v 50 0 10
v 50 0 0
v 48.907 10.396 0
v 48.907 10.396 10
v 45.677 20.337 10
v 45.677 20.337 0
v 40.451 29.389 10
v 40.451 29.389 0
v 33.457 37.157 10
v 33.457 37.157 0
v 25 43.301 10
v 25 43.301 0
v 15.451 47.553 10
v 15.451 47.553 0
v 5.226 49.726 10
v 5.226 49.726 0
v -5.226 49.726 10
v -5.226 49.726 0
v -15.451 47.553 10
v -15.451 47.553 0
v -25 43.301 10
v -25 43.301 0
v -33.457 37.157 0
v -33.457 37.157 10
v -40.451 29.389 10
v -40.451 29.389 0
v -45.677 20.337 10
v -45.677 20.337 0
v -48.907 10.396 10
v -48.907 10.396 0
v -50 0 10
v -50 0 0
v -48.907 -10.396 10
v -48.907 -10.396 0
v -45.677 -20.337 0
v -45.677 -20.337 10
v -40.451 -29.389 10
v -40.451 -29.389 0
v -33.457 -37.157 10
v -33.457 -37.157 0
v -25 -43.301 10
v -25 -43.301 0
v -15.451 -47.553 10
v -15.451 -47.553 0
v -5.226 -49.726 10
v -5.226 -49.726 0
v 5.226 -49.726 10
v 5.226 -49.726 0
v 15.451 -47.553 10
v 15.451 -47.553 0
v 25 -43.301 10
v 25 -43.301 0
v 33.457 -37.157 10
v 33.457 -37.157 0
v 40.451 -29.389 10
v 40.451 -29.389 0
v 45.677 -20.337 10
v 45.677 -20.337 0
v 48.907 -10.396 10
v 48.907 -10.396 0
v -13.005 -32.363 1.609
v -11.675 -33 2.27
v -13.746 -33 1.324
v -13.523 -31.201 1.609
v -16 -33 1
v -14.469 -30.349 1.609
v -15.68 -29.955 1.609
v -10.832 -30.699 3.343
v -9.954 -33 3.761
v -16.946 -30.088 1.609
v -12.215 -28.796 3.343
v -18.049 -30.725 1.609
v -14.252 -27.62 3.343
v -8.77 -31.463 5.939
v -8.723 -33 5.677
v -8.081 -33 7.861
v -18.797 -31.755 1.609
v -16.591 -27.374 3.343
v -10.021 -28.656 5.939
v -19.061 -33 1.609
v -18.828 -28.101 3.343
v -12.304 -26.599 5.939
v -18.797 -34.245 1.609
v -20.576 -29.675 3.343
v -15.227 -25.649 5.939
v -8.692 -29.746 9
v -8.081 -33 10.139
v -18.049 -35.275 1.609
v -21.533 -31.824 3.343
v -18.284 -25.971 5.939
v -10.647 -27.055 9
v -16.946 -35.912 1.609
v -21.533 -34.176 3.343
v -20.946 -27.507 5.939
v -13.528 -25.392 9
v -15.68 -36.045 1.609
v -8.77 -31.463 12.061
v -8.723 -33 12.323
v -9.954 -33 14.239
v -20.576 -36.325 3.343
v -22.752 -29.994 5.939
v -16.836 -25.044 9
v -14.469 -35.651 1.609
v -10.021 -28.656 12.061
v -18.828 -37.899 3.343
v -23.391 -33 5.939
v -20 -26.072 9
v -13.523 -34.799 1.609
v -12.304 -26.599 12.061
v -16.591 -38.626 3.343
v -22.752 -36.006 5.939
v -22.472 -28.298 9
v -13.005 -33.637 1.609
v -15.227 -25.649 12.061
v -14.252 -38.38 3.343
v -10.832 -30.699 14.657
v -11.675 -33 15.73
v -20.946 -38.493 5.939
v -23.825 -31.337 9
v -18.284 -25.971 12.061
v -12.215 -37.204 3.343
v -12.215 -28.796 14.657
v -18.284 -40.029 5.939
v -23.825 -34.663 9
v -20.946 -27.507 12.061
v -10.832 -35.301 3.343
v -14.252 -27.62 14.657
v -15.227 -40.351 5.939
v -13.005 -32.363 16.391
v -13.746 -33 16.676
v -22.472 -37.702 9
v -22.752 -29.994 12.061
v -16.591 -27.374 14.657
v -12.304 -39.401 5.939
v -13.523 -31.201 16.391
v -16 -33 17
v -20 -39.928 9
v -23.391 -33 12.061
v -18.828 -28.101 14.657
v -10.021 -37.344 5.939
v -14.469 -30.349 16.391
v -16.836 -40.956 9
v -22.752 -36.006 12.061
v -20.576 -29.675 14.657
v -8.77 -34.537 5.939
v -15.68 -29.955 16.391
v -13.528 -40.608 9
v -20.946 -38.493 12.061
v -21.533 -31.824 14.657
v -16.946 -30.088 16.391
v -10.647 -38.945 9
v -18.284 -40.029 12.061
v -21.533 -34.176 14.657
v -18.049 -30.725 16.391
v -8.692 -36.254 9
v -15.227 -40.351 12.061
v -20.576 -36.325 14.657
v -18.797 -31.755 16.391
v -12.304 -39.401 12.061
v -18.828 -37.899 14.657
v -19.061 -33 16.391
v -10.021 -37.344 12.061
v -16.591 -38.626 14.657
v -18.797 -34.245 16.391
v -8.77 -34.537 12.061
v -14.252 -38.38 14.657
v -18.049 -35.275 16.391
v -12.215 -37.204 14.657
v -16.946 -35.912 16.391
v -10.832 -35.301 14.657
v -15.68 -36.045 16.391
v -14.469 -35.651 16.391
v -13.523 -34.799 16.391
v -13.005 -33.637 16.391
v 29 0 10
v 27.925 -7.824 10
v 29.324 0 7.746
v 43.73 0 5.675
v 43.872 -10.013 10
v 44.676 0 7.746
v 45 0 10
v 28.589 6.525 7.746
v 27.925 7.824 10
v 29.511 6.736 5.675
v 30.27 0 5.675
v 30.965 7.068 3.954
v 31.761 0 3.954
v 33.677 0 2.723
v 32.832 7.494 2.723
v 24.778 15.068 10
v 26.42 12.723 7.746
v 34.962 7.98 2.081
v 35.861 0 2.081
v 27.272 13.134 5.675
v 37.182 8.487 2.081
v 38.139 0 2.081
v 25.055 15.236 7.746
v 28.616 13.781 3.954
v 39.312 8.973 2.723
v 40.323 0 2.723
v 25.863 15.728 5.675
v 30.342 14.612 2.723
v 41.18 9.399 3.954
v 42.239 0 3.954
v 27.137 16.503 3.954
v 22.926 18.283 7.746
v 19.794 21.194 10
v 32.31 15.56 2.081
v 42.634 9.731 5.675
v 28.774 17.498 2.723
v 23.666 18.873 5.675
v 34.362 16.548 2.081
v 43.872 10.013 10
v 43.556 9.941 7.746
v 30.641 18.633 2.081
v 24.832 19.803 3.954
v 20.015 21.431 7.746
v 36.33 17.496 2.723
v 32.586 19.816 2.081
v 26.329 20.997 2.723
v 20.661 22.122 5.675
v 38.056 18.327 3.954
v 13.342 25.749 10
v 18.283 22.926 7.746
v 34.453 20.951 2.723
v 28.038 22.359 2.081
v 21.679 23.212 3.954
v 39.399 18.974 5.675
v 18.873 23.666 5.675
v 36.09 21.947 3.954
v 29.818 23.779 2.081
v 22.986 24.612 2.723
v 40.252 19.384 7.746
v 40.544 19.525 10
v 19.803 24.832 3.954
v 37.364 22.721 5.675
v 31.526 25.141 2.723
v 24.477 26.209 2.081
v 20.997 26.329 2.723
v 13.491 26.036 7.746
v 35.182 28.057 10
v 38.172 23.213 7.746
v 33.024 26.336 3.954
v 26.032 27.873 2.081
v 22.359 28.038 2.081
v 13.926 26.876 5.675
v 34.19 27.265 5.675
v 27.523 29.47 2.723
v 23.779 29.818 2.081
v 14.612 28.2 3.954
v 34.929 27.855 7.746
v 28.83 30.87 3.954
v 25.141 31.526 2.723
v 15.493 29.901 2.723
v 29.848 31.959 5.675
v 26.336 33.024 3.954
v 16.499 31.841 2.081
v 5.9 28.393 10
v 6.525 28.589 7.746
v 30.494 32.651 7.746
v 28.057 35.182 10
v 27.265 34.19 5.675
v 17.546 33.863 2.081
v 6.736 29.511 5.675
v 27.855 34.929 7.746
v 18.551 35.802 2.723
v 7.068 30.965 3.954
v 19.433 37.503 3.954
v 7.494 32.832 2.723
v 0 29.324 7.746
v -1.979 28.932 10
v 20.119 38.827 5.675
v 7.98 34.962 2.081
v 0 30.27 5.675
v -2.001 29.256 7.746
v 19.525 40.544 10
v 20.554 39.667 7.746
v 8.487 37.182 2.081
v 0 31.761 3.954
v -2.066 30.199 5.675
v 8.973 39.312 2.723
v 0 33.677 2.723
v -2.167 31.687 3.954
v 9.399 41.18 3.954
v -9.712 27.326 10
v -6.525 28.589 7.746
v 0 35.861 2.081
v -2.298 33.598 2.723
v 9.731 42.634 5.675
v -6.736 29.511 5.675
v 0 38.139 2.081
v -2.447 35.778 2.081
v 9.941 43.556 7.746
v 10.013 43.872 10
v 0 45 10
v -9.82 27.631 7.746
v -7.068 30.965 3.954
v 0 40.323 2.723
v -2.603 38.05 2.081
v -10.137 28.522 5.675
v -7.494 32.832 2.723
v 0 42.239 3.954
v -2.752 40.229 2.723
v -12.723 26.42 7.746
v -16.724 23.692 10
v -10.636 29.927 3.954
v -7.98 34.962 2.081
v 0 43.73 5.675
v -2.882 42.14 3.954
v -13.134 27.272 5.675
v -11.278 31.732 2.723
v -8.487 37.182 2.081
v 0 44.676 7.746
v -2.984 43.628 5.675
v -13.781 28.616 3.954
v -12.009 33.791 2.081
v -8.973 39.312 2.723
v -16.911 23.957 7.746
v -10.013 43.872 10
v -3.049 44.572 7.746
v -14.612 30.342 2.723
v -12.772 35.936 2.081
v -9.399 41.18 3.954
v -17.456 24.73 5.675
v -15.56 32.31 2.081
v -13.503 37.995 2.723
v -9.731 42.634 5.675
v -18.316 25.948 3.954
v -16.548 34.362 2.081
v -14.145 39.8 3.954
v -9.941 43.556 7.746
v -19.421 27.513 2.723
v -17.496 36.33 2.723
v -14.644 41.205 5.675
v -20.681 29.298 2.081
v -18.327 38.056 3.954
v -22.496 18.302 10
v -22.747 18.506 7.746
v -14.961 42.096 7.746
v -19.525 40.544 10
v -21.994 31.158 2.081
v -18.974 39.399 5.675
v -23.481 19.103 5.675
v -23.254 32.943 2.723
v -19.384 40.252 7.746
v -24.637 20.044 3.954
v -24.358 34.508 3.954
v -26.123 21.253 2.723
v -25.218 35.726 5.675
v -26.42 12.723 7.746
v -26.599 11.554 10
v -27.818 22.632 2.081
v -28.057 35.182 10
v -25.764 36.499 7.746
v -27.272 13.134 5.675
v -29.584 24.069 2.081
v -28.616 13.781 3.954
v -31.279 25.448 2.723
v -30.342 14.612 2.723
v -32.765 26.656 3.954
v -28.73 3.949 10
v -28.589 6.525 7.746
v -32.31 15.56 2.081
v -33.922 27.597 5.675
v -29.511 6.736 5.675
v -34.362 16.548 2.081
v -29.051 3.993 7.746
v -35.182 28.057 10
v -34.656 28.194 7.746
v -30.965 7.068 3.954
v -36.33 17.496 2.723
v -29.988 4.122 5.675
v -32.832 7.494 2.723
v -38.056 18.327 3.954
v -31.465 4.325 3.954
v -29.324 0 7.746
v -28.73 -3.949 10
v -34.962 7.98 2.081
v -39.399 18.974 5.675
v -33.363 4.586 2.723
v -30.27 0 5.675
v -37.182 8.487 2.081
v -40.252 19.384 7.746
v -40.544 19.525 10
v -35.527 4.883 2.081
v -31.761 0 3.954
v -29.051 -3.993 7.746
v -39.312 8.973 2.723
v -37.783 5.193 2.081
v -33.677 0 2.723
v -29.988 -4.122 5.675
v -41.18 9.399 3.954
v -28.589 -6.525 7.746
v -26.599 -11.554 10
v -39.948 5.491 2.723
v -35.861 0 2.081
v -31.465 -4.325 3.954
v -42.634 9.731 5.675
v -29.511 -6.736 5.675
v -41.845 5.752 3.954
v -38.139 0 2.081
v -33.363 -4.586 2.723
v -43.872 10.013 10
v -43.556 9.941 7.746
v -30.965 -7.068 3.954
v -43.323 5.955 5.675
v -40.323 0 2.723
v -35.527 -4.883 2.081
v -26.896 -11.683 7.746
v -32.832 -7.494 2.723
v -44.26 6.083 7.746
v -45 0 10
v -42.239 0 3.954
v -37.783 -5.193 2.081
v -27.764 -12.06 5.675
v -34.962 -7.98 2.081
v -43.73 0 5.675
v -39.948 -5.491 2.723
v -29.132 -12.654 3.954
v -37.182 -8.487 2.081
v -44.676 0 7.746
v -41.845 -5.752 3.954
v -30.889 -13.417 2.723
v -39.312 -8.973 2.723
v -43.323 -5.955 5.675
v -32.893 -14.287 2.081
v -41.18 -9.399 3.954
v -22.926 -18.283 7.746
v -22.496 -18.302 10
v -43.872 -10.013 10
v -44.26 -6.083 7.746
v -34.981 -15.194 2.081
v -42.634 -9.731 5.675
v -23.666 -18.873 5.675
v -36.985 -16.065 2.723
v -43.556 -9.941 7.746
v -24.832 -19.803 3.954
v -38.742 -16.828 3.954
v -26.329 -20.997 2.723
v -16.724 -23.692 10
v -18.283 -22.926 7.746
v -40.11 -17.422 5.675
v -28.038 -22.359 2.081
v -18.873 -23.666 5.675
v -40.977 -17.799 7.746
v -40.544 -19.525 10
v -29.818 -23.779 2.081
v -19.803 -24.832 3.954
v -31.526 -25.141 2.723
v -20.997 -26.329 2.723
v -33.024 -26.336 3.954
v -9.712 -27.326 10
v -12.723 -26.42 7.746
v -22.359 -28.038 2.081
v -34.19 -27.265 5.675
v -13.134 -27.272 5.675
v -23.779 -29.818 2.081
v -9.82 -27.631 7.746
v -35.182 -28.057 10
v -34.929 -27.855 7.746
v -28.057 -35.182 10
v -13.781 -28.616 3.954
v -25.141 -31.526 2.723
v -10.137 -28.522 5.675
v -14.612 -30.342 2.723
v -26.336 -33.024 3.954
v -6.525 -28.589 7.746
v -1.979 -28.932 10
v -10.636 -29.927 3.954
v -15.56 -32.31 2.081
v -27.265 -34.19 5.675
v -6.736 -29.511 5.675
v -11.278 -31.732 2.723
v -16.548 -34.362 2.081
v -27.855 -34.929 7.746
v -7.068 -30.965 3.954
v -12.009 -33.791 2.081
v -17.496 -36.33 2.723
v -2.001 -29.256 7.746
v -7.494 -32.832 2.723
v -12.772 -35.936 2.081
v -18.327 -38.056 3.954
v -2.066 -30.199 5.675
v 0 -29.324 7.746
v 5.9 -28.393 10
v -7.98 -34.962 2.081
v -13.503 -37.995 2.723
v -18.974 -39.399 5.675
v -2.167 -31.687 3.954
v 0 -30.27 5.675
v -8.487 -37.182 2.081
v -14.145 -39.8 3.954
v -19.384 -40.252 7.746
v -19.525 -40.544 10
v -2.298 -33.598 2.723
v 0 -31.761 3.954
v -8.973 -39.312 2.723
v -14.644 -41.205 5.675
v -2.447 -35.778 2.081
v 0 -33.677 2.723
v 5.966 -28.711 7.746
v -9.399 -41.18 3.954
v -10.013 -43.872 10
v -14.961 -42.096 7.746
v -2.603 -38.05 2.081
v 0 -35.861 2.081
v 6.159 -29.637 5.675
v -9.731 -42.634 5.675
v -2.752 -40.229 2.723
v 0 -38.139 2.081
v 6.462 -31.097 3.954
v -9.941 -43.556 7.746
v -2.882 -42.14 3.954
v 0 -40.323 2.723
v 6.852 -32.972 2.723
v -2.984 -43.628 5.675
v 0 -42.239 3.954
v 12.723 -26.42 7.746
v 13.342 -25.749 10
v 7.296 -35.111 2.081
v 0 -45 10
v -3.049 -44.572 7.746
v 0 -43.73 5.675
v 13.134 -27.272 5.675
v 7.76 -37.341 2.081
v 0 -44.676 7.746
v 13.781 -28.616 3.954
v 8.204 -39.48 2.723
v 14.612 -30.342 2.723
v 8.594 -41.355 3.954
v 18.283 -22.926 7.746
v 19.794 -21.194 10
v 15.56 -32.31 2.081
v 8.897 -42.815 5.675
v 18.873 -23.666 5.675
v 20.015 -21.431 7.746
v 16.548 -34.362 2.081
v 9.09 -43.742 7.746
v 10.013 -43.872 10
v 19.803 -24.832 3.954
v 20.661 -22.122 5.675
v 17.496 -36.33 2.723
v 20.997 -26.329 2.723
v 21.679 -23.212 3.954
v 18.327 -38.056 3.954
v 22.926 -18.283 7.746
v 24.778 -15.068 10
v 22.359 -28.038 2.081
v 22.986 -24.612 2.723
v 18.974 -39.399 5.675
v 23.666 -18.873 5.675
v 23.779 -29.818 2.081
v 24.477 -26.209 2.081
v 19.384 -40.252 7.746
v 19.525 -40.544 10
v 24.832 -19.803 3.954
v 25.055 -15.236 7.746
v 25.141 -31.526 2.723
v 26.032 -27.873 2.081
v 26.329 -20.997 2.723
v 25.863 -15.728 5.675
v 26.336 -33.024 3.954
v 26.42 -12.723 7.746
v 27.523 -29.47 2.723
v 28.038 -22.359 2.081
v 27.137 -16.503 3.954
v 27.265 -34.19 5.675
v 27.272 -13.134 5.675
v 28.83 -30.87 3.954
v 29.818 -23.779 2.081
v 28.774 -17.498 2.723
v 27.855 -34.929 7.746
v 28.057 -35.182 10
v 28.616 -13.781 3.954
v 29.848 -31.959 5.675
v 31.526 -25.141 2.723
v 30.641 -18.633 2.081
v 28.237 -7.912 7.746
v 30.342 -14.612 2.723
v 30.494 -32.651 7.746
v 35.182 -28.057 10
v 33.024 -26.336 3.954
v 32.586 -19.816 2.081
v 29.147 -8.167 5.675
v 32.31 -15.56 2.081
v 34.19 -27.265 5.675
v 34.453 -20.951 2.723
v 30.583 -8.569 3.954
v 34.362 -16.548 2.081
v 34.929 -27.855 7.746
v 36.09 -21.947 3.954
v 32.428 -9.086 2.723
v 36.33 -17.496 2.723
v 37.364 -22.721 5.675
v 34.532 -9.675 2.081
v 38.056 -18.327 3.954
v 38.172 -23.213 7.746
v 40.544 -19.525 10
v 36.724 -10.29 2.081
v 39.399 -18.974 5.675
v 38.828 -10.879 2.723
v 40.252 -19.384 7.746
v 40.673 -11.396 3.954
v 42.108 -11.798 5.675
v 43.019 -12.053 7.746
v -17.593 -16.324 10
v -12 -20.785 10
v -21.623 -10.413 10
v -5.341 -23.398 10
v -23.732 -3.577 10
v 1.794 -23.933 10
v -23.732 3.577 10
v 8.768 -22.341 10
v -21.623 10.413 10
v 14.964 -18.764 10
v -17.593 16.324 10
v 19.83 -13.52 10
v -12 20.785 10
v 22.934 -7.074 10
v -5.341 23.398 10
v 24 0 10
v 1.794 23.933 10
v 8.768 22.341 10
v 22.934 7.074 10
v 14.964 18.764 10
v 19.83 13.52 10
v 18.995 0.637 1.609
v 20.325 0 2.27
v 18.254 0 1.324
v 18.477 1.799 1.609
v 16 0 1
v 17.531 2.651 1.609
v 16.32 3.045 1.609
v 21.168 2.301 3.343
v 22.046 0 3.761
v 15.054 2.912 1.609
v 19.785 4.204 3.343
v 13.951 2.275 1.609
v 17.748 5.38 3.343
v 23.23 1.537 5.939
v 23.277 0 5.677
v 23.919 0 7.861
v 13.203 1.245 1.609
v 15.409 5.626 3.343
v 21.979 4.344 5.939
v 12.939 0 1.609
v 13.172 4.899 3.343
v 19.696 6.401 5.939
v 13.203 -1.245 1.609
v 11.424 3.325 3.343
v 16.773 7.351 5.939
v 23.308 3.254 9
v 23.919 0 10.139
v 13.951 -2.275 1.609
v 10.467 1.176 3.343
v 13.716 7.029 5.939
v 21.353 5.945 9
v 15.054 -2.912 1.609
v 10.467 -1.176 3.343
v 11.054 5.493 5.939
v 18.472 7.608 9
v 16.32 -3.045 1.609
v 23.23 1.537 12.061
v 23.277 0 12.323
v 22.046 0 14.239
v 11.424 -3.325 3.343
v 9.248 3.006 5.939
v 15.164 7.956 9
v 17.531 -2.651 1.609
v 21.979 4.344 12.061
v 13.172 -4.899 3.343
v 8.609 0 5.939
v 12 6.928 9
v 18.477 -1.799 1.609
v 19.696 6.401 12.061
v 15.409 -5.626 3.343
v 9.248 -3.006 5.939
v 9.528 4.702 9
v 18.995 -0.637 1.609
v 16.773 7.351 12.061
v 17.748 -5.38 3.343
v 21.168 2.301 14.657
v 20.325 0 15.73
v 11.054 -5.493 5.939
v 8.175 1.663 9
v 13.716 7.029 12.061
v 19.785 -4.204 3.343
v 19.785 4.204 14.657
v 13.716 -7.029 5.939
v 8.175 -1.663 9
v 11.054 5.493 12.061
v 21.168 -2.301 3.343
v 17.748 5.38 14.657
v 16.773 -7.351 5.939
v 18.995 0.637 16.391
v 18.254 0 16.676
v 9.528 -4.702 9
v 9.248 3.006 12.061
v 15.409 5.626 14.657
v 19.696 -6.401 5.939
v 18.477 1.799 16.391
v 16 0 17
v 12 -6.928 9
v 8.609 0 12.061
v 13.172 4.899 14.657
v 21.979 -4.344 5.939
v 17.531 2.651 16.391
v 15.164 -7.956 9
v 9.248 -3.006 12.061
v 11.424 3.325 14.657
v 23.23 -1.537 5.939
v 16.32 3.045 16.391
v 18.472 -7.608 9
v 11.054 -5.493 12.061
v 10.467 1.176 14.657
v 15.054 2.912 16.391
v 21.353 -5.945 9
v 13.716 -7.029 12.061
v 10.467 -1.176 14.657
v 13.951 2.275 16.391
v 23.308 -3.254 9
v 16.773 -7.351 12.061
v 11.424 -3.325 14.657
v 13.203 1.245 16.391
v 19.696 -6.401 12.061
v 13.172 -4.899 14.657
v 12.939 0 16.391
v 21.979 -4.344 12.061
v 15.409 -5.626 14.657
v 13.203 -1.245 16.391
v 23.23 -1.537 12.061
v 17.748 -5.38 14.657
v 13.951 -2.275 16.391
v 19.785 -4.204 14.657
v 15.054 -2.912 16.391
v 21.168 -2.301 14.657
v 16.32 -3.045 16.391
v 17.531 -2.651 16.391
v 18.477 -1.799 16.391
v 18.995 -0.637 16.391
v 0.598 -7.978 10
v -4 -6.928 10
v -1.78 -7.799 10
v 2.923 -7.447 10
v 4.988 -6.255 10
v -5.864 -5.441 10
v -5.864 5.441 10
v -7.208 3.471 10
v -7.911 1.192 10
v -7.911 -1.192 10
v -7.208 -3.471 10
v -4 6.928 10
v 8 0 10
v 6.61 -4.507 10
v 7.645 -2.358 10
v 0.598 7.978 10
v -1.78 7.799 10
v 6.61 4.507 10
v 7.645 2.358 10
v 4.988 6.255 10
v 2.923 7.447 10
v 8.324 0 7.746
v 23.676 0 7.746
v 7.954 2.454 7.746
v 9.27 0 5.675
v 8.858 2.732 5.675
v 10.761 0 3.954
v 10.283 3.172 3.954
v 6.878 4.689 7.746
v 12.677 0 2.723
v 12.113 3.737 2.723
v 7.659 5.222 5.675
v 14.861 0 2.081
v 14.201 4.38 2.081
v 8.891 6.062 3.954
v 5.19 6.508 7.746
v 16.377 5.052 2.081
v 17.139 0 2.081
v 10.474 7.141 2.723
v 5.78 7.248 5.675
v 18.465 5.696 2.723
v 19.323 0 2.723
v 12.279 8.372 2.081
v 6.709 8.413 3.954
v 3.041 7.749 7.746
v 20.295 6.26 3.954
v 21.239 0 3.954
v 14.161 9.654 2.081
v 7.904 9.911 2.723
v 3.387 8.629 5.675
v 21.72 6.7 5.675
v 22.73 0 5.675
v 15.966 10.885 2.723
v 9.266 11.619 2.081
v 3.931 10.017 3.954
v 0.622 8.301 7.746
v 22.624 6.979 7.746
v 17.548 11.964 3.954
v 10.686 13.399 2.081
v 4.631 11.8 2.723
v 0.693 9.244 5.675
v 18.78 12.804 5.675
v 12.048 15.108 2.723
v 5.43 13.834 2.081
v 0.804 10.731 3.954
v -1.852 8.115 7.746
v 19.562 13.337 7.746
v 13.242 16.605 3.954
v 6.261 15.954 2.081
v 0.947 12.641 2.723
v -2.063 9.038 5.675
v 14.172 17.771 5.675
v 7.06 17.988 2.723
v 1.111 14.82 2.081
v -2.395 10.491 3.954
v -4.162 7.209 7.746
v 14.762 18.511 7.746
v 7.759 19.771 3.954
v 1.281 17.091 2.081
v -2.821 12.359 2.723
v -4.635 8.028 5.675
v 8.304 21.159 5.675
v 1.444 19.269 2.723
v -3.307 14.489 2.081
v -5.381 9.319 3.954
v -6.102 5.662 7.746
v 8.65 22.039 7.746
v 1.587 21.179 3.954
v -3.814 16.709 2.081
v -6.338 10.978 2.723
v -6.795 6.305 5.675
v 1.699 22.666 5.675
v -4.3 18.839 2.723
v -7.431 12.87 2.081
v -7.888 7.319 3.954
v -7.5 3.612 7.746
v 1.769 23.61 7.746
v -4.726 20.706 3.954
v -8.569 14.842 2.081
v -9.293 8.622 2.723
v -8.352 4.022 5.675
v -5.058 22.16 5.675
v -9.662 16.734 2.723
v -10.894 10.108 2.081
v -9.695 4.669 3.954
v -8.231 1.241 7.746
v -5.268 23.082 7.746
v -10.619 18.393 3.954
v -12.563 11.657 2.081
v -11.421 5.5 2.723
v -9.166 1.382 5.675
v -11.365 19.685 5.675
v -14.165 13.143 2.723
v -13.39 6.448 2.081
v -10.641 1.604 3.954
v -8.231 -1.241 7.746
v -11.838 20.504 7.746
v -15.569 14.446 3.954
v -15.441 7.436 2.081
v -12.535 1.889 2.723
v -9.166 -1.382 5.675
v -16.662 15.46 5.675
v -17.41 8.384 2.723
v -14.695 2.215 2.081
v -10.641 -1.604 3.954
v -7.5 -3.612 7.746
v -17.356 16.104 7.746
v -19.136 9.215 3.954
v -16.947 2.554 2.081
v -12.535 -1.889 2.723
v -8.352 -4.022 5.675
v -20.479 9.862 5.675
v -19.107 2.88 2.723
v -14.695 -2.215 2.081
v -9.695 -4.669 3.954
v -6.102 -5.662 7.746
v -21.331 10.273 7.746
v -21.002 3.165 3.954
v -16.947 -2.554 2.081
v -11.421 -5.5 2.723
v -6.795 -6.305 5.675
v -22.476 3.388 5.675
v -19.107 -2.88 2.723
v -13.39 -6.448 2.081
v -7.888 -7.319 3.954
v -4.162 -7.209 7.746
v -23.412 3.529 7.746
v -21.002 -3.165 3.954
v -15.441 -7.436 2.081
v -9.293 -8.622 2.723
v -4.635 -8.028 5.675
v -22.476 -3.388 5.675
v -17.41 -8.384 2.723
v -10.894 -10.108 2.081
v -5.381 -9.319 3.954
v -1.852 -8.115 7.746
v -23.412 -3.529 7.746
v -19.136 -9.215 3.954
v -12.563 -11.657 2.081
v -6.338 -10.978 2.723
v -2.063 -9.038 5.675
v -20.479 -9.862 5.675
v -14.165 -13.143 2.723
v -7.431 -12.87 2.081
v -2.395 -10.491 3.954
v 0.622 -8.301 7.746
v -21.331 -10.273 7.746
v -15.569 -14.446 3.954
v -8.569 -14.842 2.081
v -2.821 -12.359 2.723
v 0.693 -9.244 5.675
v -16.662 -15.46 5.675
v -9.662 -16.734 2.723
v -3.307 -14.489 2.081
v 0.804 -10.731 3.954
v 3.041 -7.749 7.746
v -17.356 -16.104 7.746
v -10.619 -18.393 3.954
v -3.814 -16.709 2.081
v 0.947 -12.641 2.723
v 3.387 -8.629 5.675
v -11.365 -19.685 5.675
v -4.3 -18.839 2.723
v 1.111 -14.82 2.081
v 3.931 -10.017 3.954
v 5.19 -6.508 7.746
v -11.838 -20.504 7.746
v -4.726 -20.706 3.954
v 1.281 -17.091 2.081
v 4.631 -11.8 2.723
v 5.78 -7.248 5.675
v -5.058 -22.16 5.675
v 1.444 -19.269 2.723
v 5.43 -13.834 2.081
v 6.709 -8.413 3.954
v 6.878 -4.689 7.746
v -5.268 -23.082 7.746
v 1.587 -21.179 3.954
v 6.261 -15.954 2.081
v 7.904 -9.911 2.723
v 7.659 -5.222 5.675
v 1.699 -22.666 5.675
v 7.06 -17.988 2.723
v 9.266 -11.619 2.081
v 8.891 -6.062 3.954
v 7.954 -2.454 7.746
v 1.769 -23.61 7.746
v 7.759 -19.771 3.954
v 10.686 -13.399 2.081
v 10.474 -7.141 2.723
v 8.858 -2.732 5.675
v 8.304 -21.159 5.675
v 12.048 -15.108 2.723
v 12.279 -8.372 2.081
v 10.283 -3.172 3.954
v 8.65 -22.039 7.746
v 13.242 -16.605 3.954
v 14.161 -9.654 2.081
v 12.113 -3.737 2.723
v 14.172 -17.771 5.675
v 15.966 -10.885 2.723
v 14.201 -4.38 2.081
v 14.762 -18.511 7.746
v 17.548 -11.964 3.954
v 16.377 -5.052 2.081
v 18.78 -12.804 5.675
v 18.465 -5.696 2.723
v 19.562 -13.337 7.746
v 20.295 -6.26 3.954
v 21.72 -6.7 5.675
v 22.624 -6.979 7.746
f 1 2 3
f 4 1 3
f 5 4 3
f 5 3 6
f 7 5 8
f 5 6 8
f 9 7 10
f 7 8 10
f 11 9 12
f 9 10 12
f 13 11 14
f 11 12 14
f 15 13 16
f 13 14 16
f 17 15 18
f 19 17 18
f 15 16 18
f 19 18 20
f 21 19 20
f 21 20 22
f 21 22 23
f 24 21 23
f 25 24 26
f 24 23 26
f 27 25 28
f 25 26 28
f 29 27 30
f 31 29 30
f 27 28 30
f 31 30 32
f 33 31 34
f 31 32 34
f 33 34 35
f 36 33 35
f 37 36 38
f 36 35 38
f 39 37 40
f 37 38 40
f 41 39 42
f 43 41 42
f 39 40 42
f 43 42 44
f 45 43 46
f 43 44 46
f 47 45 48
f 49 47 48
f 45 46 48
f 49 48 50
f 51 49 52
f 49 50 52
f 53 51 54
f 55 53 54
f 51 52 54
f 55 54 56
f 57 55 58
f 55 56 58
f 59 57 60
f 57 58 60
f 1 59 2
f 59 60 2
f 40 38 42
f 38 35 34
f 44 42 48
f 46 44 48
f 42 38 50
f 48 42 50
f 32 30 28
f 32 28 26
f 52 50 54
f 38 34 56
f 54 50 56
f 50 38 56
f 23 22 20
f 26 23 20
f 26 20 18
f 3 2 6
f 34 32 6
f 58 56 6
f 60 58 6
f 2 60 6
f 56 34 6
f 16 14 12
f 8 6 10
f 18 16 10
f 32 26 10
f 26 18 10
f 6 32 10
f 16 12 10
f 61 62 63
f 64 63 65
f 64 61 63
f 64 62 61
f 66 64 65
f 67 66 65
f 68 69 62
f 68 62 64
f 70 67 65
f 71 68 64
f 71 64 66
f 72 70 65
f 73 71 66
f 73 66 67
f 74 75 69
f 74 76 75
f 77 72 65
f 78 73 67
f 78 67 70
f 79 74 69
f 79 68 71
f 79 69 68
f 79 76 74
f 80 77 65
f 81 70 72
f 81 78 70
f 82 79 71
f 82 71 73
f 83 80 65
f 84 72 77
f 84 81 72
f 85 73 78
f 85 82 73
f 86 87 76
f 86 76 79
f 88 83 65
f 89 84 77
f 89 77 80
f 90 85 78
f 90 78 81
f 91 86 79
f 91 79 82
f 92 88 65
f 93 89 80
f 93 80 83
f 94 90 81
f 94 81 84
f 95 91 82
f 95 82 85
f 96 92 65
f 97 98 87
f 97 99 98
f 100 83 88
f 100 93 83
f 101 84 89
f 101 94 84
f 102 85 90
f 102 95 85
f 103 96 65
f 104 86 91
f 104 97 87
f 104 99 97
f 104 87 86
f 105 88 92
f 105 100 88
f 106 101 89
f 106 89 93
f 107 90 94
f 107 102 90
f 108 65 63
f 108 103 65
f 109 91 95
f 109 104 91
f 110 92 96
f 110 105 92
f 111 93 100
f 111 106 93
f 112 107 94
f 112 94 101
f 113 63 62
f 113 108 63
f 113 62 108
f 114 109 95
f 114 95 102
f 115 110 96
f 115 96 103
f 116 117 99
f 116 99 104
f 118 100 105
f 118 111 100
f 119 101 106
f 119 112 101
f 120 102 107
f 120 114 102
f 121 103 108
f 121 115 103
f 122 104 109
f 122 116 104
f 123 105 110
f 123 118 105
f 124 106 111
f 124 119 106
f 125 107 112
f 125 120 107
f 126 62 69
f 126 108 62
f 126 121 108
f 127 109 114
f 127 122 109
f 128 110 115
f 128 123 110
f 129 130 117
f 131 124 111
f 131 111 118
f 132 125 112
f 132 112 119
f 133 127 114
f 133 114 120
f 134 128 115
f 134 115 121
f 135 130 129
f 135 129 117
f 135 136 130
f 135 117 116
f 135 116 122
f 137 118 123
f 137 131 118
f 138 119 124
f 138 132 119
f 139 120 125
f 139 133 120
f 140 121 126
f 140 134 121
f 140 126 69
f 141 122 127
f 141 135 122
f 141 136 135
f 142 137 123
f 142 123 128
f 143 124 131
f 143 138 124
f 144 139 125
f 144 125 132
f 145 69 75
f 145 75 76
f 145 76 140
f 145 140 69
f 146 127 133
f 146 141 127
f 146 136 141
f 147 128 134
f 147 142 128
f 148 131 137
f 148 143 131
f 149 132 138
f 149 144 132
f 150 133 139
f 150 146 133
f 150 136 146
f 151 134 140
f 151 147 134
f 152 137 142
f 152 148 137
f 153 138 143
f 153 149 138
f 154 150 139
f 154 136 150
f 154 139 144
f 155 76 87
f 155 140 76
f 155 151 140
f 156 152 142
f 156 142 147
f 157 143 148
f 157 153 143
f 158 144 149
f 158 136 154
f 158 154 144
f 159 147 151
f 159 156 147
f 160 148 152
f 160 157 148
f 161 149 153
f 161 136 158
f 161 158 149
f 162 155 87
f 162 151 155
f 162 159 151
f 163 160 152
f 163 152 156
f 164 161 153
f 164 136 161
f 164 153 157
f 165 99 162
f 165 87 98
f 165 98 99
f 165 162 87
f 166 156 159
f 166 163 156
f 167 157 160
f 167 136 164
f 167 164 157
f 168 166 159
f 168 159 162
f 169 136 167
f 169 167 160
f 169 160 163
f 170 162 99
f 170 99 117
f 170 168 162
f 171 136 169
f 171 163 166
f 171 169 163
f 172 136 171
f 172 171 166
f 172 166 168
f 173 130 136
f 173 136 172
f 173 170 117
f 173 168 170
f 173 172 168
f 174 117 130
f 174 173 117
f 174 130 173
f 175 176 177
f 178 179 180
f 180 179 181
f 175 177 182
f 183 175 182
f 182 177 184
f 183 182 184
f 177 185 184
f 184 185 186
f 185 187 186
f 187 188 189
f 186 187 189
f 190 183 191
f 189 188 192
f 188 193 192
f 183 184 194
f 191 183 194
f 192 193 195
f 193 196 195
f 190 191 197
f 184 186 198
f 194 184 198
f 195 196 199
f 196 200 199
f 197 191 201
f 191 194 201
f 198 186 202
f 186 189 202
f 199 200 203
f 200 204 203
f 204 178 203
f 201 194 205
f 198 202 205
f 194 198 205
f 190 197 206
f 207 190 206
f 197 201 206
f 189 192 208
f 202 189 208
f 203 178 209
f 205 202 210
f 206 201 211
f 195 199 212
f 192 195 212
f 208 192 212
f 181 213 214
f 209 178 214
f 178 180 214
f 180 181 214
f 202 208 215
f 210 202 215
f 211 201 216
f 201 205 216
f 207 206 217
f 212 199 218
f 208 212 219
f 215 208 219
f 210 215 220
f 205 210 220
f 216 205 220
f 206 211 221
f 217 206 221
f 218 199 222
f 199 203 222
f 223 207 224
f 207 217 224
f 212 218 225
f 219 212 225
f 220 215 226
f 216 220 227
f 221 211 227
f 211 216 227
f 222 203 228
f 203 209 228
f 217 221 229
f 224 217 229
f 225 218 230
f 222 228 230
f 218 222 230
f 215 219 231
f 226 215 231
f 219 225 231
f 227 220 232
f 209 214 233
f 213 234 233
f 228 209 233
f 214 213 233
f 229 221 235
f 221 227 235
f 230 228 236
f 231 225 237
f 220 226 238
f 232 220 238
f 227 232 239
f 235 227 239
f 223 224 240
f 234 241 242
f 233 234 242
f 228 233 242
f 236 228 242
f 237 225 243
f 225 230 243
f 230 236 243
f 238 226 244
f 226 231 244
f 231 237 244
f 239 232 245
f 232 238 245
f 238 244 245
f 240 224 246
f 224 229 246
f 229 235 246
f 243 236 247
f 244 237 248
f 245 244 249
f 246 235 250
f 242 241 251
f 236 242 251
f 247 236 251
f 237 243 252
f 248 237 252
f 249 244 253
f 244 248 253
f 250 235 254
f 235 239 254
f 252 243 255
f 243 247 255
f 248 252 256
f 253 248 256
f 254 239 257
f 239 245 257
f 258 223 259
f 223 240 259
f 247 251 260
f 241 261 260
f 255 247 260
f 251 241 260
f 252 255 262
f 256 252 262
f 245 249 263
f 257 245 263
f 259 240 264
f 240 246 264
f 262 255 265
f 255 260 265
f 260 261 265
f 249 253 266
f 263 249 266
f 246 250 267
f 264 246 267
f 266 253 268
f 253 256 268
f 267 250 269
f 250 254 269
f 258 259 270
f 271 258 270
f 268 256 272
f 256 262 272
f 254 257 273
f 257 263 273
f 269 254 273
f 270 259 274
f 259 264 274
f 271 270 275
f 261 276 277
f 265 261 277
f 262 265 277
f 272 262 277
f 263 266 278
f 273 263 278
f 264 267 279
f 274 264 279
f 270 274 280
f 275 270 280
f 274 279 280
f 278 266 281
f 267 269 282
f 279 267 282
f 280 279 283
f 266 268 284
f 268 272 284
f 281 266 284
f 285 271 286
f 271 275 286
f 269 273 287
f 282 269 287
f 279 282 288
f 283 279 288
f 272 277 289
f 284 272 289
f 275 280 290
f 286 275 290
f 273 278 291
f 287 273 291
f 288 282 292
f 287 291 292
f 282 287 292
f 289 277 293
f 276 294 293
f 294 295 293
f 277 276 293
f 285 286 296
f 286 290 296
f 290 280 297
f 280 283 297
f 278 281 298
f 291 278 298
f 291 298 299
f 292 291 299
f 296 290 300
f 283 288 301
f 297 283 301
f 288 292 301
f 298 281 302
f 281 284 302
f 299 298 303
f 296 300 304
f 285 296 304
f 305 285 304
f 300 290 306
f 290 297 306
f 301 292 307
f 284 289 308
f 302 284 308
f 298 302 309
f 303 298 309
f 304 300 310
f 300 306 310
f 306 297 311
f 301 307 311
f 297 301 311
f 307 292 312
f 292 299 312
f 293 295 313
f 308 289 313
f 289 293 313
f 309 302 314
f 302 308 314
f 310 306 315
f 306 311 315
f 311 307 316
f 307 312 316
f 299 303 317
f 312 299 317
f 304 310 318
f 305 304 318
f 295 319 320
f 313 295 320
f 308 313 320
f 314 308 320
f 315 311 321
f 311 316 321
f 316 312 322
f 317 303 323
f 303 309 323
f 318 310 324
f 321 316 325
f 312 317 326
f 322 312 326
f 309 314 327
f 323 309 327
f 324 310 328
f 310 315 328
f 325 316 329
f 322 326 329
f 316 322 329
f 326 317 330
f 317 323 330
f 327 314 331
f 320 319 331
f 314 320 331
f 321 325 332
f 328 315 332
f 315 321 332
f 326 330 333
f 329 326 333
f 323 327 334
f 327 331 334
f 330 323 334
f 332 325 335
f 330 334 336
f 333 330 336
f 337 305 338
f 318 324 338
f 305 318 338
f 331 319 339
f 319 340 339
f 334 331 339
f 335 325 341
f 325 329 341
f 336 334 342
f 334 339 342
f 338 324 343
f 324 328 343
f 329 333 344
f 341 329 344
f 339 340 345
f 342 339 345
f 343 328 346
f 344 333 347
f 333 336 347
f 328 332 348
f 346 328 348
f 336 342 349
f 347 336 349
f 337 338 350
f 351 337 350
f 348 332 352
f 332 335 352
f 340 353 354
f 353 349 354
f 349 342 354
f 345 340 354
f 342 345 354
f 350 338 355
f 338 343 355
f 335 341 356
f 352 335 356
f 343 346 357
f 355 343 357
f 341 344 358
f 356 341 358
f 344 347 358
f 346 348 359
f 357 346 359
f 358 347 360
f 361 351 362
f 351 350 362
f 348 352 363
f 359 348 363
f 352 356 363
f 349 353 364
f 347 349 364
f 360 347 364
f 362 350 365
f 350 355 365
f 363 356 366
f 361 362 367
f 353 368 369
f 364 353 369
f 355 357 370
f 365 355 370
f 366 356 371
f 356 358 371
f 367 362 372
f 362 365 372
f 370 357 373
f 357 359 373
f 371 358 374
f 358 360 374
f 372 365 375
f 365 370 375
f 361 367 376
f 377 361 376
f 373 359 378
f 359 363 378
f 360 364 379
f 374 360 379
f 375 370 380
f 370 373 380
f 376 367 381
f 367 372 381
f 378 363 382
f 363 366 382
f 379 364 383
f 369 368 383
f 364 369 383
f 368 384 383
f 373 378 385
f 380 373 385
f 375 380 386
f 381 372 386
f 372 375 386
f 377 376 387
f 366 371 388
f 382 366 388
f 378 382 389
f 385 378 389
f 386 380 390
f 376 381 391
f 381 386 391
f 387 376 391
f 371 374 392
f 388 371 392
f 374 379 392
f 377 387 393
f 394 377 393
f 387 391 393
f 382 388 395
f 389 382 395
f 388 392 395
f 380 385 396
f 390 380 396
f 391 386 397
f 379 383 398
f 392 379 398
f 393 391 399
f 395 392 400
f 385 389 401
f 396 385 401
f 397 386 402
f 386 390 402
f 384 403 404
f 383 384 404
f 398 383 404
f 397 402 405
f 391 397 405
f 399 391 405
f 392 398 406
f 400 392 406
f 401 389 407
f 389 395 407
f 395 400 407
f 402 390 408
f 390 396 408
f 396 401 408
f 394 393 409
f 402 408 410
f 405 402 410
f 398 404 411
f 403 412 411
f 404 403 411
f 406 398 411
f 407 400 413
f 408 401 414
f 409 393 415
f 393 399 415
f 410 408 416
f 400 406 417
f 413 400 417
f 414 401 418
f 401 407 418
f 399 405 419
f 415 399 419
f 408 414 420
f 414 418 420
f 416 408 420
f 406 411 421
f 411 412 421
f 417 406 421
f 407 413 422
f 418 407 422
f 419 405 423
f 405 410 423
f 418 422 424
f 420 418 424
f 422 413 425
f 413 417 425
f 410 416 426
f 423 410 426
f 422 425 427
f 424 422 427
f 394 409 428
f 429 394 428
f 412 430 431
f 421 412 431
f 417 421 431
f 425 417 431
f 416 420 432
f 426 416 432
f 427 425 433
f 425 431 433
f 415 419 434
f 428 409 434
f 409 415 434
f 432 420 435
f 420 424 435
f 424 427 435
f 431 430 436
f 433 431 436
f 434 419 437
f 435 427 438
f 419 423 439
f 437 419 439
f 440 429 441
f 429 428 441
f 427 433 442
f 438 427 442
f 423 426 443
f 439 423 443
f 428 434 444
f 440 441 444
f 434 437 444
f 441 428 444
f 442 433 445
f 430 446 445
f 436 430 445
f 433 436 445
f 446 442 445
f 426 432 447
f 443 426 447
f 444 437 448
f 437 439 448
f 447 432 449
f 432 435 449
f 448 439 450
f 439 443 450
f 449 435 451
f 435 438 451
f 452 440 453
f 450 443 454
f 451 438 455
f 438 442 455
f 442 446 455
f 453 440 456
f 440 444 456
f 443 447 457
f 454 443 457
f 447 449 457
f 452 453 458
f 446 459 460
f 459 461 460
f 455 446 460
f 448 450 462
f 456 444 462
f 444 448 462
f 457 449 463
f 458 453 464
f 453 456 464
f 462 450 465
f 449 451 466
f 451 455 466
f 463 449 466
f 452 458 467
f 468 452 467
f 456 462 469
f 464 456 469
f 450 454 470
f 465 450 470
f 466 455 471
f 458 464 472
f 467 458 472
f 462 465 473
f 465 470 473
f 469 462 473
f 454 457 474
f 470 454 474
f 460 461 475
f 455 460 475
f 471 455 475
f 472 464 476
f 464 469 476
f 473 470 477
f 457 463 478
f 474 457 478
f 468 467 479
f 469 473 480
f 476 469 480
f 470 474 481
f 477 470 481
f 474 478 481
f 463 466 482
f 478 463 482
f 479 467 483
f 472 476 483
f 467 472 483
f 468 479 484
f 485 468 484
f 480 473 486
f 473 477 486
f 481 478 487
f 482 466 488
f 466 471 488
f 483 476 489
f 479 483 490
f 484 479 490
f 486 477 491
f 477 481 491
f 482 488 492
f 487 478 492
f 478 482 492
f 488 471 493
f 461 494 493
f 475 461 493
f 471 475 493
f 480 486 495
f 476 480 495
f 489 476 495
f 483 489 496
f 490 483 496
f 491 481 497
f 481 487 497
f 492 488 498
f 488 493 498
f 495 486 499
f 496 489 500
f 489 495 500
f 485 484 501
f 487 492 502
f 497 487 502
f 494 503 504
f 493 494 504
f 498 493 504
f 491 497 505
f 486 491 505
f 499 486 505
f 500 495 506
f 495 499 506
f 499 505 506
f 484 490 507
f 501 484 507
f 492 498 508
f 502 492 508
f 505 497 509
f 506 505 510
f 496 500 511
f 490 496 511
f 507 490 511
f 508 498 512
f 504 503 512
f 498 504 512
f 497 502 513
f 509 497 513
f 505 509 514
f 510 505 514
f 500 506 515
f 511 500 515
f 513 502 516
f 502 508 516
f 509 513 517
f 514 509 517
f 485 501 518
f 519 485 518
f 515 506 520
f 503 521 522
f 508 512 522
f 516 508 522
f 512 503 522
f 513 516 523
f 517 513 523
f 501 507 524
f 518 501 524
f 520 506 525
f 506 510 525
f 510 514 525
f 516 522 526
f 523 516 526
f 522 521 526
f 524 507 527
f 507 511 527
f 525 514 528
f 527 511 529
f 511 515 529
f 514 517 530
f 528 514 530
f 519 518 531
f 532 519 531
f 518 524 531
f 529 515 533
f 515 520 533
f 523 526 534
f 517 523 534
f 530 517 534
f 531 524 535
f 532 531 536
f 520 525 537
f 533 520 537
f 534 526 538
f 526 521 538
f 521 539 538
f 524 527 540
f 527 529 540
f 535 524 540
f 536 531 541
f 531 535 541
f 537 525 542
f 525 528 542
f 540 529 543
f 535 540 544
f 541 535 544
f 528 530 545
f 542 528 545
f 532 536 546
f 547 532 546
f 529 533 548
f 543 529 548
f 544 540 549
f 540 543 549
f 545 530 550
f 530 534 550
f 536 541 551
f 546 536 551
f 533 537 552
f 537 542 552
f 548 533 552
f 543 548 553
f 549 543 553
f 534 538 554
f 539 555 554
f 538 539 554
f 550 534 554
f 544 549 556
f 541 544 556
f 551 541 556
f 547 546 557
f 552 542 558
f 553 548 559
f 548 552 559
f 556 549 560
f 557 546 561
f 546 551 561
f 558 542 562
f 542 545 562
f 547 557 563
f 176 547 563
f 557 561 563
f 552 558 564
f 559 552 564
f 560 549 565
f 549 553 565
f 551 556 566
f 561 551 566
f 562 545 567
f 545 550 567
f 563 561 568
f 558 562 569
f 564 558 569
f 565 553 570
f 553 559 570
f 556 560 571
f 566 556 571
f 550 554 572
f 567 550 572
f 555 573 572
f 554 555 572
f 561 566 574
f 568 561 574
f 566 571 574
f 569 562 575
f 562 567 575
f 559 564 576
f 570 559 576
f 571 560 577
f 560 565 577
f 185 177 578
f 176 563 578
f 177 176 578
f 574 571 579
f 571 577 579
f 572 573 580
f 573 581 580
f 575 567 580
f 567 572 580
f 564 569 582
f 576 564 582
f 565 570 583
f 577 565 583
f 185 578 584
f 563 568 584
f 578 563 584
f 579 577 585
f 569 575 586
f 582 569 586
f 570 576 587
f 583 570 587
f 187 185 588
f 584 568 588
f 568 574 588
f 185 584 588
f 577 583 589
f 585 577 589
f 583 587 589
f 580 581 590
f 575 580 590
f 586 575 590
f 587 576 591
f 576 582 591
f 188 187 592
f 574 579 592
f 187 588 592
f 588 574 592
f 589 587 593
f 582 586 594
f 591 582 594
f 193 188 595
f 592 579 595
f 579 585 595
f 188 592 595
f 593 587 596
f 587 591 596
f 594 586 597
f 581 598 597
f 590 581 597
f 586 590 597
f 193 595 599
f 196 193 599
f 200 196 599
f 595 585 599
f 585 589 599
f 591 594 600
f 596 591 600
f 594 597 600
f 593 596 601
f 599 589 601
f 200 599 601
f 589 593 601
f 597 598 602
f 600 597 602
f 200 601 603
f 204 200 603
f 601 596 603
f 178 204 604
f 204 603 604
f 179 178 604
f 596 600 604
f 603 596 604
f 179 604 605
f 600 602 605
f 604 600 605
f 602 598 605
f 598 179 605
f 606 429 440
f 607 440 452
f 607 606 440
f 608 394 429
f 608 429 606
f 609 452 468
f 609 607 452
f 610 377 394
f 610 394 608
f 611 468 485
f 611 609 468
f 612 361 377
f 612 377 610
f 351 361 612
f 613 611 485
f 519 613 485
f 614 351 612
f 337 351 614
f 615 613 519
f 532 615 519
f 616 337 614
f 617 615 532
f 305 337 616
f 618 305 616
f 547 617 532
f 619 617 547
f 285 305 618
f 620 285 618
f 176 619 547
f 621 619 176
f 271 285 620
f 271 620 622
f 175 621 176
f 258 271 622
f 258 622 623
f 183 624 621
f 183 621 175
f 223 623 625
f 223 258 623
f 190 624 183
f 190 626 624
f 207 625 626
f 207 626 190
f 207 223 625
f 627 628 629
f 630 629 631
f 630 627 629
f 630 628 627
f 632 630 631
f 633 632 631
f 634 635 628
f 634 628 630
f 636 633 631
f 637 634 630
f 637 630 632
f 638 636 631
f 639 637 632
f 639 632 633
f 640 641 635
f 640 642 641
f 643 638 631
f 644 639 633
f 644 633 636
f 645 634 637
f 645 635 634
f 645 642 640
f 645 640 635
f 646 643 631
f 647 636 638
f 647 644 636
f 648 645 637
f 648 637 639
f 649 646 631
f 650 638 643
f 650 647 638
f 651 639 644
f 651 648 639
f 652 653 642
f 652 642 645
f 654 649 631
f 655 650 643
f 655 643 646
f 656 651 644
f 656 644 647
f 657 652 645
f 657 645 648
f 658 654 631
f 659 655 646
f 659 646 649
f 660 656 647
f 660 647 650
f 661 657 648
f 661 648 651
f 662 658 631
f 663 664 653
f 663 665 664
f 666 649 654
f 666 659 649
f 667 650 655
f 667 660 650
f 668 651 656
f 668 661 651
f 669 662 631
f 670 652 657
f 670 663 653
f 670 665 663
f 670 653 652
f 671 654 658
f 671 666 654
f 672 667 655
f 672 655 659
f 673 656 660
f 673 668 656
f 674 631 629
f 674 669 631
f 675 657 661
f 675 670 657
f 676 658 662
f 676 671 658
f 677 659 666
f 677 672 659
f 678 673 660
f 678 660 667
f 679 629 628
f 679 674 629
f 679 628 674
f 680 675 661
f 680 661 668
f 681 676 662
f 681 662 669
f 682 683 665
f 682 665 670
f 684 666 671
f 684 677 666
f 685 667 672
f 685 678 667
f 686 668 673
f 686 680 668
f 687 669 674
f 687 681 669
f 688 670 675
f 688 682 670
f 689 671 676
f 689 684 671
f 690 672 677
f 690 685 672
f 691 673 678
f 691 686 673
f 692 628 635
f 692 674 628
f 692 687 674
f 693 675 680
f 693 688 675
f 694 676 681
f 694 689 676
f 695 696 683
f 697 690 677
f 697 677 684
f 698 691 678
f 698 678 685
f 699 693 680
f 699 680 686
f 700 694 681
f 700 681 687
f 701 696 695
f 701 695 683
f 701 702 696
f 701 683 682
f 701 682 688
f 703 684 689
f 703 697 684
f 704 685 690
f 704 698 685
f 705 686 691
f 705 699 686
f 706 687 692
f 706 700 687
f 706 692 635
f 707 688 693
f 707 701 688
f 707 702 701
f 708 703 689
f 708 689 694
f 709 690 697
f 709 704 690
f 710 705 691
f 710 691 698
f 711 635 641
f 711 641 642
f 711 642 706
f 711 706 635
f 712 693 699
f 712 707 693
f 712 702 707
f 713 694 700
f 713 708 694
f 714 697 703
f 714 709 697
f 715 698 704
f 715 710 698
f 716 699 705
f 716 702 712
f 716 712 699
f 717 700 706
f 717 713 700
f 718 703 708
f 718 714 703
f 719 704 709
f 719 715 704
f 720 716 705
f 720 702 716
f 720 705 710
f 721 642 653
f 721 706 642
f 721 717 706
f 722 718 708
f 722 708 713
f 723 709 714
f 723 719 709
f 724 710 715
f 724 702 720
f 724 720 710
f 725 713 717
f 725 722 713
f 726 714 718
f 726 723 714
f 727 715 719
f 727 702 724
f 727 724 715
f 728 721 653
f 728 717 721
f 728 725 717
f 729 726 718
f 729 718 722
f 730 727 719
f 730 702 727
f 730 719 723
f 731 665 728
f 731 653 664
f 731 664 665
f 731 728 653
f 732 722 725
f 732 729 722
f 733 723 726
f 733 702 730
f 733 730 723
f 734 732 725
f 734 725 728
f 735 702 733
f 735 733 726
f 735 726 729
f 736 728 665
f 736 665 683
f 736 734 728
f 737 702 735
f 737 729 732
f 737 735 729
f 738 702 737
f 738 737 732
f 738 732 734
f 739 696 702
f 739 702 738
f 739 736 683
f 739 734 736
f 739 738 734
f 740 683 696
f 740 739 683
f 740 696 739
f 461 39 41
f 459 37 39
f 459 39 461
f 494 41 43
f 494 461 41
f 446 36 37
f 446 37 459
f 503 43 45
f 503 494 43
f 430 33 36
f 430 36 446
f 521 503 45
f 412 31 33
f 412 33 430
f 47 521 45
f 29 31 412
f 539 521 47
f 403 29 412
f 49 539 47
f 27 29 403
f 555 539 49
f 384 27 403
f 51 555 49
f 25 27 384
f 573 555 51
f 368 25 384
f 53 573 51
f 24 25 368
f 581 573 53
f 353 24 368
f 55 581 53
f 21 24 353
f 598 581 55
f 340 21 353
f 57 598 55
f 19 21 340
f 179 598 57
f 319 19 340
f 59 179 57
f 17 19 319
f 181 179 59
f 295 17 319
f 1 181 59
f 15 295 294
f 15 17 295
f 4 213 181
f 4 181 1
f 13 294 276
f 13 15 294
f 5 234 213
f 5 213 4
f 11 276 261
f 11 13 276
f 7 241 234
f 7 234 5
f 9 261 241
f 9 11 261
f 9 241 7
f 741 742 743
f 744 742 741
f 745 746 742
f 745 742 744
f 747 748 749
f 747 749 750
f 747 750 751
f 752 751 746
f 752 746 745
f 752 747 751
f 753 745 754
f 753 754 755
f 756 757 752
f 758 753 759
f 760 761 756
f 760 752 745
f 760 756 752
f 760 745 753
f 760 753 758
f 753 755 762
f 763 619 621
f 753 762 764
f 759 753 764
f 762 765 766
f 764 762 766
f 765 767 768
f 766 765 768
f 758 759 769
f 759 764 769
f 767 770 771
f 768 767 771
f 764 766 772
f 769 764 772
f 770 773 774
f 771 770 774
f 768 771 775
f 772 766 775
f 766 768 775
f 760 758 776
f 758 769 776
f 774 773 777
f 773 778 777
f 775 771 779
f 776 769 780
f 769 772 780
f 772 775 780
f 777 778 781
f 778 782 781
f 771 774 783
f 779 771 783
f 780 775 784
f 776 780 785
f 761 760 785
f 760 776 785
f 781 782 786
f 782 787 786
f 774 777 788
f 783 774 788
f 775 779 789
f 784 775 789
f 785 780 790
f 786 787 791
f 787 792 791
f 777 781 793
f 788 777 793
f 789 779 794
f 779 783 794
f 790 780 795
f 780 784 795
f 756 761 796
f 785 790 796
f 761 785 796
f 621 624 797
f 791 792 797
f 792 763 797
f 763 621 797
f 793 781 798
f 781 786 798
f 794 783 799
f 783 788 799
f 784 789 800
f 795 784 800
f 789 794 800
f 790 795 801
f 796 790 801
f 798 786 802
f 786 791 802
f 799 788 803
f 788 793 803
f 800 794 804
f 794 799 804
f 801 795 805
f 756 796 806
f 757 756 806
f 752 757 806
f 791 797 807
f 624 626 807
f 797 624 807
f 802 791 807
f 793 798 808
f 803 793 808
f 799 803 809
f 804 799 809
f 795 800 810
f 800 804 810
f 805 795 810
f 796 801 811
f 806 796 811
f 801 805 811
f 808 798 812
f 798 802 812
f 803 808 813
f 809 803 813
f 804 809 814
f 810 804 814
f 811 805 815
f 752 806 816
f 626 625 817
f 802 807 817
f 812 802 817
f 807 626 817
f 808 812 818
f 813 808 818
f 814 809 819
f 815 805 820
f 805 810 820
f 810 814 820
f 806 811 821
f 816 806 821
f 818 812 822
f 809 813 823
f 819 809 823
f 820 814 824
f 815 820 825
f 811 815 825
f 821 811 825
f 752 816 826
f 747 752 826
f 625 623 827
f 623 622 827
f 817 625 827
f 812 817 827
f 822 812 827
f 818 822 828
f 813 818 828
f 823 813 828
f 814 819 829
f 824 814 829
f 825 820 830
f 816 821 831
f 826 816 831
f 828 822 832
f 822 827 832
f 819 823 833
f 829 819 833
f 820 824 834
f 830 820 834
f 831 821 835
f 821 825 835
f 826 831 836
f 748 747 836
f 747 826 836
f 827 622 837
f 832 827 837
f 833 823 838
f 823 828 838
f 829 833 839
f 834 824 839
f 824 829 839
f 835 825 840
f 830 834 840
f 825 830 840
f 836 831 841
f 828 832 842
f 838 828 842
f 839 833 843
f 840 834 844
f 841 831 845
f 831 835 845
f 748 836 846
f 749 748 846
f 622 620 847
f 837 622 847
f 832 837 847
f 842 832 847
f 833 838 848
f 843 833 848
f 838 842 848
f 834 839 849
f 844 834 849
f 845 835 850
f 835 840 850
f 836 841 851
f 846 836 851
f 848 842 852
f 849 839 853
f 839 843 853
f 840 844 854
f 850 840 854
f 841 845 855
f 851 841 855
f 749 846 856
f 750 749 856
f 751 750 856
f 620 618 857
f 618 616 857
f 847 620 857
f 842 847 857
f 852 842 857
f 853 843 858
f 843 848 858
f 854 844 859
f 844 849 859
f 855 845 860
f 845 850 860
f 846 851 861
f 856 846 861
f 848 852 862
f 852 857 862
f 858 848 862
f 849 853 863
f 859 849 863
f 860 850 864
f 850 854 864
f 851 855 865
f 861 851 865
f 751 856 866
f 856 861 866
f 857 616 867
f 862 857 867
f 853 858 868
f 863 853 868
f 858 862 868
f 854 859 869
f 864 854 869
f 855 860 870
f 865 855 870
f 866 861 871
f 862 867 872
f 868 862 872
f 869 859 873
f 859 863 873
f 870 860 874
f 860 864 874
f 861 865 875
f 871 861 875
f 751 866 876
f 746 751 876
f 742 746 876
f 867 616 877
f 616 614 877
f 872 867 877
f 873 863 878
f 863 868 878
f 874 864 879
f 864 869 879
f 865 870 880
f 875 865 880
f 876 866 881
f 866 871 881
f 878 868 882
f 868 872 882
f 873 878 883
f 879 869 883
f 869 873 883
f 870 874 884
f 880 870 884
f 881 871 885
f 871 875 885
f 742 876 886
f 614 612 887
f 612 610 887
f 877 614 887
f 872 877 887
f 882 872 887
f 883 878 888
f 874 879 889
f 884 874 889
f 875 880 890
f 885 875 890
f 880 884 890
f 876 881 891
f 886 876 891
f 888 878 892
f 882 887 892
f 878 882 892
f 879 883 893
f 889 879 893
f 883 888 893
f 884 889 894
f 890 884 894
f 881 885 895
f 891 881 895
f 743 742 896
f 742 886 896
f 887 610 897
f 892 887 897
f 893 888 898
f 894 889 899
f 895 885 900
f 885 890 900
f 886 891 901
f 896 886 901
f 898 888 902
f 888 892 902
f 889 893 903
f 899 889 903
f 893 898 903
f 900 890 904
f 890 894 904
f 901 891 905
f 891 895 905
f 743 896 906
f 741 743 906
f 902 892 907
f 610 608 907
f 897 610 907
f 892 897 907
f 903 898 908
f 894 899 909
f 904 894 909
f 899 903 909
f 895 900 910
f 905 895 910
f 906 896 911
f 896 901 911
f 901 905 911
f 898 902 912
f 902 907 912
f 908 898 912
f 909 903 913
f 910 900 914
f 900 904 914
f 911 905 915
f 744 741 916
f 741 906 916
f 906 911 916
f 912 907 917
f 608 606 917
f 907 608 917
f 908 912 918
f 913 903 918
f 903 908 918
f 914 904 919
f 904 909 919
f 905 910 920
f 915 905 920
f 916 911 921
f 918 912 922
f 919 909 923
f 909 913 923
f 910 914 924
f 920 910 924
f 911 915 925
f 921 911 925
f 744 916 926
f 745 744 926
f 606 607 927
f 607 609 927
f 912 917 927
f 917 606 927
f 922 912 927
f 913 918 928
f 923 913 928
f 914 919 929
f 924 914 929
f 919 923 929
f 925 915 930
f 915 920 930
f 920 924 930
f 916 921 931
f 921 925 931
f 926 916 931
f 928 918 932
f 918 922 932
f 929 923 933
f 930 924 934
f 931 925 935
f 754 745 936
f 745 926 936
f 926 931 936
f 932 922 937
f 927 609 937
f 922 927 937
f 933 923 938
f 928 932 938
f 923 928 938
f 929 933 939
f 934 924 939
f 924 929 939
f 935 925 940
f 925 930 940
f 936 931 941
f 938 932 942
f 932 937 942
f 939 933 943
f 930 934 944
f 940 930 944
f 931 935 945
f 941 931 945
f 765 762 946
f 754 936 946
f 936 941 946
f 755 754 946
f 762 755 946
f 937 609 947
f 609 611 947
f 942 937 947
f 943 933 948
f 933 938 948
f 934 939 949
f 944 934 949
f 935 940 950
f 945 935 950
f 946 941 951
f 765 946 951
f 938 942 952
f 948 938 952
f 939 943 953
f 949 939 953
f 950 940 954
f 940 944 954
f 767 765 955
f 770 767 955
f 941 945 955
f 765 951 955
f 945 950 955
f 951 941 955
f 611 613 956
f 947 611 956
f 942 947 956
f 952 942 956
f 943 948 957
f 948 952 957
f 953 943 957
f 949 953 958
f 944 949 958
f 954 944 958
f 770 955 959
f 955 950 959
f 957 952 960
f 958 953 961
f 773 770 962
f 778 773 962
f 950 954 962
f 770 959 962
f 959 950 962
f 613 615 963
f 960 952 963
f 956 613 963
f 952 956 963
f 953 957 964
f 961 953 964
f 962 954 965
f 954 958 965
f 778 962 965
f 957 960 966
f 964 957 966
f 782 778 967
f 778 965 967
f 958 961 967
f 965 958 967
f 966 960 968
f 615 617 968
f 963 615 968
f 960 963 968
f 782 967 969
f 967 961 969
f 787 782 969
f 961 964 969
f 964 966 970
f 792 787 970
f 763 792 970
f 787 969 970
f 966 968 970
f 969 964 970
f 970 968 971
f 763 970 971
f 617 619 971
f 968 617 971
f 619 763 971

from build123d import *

# Parameters (mm, degrees)
TORUS_R        = 8
TORUS001_R     = 8
CYLINDER_R     = 50
CYLINDER_DEPTH = 10


with BuildPart() as torus:
    # Torus → Torus (revolve)
    with BuildSketch(Plane(origin=(0, 0, 10), x_dir=(1, 0, 0), z_dir=(0, -1, 0))):
        with Locations((16, 0)):
            Circle(TORUS_R)
    revolve(axis=Axis((0, 0, 10), (0, 0, 1)))


with BuildPart() as fusion:
    # Torus001 → Torus001 (revolve)
    with BuildSketch(Plane(origin=(0, 0, 10), x_dir=(1, 0, 0), z_dir=(0, -1, 0))):
        with Locations((37, 0)):
            Circle(TORUS001_R)
    revolve(axis=Axis((0, 0, 10), (0, 0, 1)))

    # Fusion: union Torus
    add(torus.part)


with BuildPart() as porta_bales:
    # Cylinder → Cylinder (new body)
    with BuildSketch(Plane.XY):
        Circle(CYLINDER_R)
    extrude(amount=CYLINDER_DEPTH)

    # Cut: cut Fusion
    add(fusion.part, mode=Mode.SUBTRACT)


with BuildPart() as sphere:
    # Sphere → Sphere (revolve)
    with BuildSketch(Plane(origin=(16, 0, 9), x_dir=(1, 0, 0), z_dir=(0, -1, 0))):
        with BuildLine():
            ThreePointArc((0, -8), (8, 0), (0, 8))
            Line((0, 8), (0, -8))
        make_face()
    revolve(axis=Axis((16, 0, 9), (0, 0, 1)))


with BuildPart() as sphere001:
    # Sphere001 → Sphere001 (revolve)
    with BuildSketch(Plane(origin=(-16, -33, 9), x_dir=(1, 0, 0), z_dir=(0, -1, 0))):
        with BuildLine():
            ThreePointArc((0, -8), (8, 0), (0, 8))
            Line((0, 8), (0, -8))
        make_face()
    revolve(axis=Axis((-16, -33, 9), (0, 0, 1)))


solid = Compound([porta_bales.part, sphere.part, sphere001.part])
